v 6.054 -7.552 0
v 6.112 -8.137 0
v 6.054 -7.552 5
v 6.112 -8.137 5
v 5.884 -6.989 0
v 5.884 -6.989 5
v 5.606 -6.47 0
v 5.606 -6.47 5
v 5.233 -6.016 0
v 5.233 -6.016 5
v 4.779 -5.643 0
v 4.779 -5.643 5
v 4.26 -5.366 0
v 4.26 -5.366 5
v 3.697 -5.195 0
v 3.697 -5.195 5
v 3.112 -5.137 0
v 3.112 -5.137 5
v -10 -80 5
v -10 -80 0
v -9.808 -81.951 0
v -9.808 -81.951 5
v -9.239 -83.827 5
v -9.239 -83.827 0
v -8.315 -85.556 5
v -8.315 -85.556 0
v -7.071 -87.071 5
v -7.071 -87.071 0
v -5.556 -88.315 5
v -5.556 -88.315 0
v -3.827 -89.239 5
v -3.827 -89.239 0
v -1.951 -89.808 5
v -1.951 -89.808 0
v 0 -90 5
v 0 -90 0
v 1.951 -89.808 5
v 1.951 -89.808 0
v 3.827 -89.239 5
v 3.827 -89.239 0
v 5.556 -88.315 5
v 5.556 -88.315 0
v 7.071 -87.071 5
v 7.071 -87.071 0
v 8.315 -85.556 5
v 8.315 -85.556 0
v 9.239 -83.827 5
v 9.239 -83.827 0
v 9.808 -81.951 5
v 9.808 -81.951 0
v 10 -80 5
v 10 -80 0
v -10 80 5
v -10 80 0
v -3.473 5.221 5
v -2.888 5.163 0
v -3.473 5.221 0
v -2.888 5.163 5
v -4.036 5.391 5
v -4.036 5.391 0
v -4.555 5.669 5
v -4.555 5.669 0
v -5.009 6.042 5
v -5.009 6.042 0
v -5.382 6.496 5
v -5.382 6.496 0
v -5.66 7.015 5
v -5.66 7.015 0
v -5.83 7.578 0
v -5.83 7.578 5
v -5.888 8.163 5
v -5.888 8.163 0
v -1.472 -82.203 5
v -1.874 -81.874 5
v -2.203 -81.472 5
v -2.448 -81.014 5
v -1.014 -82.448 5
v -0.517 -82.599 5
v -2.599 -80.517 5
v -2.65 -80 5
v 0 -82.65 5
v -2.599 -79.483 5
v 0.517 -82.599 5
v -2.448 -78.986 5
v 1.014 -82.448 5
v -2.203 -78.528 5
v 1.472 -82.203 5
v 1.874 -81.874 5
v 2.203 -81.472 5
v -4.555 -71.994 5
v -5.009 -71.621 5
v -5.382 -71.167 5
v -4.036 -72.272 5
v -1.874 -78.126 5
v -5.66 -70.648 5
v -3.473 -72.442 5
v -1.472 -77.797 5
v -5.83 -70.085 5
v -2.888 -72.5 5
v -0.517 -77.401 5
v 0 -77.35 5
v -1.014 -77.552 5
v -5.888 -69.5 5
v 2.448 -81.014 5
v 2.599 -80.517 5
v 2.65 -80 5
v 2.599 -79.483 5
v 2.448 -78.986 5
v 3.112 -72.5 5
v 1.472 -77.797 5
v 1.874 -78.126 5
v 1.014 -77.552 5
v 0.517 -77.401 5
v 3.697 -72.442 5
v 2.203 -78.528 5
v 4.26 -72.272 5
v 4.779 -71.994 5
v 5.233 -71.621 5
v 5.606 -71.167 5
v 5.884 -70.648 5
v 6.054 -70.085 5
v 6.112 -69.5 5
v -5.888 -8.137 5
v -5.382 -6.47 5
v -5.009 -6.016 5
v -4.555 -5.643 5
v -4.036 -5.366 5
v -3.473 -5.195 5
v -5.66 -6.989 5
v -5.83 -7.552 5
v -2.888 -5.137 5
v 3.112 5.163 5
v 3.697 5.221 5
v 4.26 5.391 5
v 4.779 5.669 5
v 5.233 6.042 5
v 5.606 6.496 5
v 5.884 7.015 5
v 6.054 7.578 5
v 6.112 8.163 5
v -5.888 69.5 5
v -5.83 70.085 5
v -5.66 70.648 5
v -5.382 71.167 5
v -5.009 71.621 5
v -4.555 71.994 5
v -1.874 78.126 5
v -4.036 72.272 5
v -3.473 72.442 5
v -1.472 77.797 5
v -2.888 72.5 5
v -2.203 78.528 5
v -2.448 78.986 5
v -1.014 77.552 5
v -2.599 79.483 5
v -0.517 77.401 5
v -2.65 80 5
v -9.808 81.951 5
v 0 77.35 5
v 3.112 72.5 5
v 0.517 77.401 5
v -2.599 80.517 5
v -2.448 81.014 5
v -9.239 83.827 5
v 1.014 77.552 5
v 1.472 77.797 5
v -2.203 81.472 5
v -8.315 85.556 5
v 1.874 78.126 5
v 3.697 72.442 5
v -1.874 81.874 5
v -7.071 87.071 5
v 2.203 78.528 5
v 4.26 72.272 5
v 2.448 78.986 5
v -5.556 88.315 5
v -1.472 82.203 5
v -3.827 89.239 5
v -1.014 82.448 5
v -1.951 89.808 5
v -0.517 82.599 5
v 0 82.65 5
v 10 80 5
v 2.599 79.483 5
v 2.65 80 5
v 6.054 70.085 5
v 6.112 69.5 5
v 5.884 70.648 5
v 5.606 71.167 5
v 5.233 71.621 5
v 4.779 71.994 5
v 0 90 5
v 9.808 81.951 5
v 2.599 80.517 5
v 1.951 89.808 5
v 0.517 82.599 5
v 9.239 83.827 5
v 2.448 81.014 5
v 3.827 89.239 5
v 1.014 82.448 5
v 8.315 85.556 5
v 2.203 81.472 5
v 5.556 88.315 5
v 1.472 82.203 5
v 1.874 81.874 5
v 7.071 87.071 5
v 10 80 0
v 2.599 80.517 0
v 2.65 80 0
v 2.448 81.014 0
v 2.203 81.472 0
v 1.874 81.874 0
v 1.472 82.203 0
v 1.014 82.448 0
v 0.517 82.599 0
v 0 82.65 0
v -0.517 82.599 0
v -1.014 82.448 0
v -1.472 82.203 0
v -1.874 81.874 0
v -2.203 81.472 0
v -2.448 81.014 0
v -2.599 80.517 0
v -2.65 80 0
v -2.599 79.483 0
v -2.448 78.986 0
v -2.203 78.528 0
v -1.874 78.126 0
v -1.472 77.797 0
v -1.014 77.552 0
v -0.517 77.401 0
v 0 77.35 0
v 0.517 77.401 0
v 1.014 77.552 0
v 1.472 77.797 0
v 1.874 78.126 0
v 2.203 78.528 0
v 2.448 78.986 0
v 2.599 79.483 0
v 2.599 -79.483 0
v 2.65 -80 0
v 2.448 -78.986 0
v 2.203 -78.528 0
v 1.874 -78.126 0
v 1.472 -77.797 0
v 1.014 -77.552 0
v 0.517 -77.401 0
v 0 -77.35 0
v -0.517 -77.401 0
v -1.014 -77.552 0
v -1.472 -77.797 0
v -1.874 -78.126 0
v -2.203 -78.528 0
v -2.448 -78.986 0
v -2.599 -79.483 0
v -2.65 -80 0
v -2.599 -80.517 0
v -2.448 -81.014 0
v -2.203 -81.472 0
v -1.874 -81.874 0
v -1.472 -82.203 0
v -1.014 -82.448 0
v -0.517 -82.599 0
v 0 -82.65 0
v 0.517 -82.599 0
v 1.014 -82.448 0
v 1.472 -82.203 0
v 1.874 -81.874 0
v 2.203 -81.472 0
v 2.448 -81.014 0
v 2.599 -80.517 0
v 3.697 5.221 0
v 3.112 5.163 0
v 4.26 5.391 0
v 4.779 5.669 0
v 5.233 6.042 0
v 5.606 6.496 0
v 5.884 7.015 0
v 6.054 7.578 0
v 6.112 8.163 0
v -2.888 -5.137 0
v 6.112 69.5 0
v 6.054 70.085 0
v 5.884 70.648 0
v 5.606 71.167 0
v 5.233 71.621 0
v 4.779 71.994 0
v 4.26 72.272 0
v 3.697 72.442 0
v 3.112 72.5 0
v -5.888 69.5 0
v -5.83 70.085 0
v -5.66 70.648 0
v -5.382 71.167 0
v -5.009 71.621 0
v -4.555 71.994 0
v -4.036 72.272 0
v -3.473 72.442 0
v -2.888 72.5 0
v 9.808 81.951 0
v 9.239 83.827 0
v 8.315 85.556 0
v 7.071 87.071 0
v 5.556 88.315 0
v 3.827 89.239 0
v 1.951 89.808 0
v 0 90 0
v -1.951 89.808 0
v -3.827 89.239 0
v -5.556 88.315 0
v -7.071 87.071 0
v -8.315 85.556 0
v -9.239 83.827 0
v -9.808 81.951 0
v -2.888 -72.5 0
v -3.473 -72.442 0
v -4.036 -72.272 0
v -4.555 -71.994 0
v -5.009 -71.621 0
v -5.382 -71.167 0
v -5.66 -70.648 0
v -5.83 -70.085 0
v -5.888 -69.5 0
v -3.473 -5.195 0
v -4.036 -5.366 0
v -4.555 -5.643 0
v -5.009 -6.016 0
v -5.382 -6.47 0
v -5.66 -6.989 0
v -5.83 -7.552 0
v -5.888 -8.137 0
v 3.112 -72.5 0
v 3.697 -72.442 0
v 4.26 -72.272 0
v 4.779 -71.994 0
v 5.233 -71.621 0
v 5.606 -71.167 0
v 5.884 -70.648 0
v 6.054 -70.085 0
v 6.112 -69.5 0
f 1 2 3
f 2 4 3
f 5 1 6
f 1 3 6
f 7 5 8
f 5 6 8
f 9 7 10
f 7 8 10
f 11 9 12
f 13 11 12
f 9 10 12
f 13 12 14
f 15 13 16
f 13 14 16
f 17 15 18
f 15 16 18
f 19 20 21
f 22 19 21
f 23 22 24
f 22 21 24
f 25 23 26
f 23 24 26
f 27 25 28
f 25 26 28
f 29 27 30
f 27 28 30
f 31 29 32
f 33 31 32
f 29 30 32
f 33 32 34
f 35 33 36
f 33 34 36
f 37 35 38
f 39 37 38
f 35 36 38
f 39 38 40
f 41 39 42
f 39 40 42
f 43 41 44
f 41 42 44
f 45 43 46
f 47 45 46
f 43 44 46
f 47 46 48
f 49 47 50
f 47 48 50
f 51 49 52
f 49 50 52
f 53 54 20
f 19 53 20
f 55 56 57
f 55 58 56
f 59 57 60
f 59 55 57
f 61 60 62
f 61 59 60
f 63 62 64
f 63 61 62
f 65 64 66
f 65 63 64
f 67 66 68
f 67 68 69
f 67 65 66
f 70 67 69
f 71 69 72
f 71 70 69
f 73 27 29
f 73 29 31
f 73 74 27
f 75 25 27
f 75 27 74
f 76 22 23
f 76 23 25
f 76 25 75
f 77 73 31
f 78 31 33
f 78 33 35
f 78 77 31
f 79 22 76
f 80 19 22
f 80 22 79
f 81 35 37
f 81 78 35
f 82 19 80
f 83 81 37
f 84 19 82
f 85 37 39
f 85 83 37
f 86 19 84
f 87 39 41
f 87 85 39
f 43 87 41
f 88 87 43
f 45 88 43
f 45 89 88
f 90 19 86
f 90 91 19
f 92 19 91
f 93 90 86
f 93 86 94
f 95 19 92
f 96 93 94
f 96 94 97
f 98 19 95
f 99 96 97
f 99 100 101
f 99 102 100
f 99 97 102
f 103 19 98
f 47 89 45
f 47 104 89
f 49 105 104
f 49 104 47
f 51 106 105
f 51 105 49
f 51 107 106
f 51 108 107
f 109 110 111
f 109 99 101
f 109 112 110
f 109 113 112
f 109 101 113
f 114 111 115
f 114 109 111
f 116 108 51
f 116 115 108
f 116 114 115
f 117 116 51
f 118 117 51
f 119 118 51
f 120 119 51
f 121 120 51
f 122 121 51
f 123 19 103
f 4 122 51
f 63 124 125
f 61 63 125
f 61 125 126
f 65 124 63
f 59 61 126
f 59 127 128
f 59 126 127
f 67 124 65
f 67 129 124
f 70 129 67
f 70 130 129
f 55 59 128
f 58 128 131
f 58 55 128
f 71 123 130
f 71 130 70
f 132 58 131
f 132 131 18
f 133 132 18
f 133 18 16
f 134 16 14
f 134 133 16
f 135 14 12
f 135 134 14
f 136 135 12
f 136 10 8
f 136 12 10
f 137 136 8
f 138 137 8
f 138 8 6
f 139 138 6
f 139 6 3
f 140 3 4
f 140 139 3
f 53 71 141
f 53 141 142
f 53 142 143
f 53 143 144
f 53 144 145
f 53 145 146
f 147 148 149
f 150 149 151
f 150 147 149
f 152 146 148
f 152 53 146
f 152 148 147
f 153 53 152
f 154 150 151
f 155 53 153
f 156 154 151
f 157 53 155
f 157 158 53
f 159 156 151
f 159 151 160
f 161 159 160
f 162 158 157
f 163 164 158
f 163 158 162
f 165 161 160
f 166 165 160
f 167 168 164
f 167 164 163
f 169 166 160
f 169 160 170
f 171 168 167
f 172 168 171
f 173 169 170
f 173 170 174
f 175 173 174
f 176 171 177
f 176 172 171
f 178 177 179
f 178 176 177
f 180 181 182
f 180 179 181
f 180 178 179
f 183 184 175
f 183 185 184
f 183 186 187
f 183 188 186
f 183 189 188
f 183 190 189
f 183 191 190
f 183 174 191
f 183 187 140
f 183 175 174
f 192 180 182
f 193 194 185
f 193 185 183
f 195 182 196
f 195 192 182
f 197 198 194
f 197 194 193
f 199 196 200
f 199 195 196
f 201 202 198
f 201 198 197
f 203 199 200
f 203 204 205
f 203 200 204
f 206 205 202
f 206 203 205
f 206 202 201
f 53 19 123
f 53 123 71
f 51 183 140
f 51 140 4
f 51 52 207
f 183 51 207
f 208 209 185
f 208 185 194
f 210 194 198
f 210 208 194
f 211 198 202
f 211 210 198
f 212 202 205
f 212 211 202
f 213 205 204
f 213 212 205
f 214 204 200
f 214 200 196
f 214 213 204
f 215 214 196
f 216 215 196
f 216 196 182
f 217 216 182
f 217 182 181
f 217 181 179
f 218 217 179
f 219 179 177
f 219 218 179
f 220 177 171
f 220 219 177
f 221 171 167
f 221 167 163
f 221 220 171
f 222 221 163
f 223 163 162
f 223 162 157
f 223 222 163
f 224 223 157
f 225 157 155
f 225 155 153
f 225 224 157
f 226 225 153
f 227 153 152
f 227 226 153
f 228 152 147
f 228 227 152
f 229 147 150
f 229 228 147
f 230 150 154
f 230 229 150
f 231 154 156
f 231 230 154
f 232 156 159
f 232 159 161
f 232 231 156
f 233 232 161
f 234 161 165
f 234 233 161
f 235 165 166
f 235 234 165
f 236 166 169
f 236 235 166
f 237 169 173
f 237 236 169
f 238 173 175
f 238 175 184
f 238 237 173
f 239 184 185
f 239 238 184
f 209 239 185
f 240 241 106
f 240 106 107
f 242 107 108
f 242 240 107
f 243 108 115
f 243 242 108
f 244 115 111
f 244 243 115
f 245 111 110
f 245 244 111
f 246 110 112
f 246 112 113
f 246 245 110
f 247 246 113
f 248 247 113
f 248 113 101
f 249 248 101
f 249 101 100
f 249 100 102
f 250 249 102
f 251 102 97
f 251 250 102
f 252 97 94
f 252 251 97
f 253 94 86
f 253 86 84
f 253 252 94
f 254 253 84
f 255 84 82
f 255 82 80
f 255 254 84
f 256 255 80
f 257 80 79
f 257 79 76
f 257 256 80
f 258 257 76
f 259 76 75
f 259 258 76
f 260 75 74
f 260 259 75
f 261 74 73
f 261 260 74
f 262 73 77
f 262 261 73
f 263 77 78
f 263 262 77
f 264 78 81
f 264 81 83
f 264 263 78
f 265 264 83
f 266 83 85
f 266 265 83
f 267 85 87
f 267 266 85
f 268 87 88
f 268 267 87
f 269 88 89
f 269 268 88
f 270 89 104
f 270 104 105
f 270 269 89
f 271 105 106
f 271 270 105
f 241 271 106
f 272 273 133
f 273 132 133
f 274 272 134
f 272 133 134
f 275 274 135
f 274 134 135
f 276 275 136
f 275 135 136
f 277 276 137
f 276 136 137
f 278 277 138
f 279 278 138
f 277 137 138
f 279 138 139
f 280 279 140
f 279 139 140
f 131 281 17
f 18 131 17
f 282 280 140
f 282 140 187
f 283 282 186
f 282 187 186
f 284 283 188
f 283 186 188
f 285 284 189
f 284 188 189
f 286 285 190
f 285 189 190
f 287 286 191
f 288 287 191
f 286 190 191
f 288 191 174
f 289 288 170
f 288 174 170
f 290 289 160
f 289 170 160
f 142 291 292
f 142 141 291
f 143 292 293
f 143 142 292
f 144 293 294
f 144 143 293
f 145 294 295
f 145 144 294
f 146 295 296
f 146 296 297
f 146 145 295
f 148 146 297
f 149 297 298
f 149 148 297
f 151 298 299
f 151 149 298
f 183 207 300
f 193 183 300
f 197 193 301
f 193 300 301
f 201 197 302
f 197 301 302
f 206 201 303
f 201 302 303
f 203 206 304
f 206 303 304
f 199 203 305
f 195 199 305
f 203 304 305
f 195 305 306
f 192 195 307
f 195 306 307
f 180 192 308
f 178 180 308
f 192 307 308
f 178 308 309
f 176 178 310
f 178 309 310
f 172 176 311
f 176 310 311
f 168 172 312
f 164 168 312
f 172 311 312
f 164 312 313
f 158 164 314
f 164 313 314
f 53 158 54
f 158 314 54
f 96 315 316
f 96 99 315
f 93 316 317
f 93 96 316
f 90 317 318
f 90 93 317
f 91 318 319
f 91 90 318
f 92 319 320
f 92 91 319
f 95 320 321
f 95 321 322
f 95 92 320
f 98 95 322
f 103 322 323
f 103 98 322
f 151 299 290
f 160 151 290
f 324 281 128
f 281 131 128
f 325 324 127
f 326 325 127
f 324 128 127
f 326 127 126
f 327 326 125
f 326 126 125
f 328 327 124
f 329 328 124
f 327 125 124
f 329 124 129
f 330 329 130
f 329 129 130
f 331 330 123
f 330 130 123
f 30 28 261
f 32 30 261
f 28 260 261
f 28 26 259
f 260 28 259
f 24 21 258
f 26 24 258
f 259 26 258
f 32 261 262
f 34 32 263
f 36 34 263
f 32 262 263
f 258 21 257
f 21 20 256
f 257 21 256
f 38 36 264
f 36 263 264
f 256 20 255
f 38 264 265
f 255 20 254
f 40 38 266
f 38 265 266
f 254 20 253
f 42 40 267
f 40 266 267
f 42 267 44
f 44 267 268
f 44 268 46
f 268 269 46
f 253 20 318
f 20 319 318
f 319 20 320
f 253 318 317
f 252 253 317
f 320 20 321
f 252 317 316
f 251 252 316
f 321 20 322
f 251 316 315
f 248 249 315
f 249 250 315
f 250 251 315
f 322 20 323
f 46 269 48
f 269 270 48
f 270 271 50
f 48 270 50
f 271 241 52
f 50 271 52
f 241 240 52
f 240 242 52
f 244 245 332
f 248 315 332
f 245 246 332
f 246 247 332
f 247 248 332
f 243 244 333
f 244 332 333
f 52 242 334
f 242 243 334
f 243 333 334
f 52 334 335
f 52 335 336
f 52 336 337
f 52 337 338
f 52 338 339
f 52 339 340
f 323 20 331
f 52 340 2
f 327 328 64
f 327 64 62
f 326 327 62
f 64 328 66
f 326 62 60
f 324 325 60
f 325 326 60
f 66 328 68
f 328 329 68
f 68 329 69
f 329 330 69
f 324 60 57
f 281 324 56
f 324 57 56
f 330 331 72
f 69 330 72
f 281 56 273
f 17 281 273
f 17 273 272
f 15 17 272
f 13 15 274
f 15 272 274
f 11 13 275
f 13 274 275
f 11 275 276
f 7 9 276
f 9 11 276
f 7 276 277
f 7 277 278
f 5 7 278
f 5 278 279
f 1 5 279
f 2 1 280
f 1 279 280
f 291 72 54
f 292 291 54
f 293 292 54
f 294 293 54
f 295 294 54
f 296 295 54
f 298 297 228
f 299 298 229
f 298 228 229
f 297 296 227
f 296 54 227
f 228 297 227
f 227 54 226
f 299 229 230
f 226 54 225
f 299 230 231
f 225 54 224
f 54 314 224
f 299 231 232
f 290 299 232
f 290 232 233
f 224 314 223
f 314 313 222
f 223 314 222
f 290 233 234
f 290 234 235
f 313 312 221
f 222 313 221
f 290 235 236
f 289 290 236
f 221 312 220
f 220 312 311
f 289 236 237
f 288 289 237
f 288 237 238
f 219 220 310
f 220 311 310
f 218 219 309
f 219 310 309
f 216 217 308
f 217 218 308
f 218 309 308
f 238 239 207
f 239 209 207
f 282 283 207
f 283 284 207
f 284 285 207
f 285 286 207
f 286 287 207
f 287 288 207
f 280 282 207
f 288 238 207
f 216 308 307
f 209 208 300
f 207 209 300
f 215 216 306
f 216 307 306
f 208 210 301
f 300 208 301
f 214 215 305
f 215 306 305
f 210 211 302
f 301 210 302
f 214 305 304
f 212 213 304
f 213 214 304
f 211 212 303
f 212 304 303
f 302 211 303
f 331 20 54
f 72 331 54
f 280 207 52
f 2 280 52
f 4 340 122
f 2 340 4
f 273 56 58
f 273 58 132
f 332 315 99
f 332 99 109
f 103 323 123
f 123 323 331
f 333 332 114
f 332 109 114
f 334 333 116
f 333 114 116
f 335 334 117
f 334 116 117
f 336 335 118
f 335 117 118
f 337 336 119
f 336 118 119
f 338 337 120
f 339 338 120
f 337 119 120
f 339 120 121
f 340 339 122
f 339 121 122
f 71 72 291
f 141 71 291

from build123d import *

# Parameters (mm, degrees)
SKETCH_1_R      = 2.65
SKETCH_1_W      = 12
SKETCH_1_H      = 67.337004634
SKETCH_1_H_2    = 67.362830637
EXTRUDE_1_DEPTH = 5
FILLET_1_R      = 3


with BuildPart() as part:
    # 草图1 → 凸台-拉伸1 (new body)
    with BuildSketch(Plane.XY):
        with BuildLine():
            Line((-10, 80), (-10, -80))
            ThreePointArc((-10, -80), (0, -90), (10, -80))
            Line((10, -80), (10, 80))
            ThreePointArc((10, 80), (0, 90), (-10, 80))
        make_face()
        with Locations((0, 80)):
            Circle(SKETCH_1_R, mode=Mode.SUBTRACT)
        with Locations((0, -80)):
            Circle(SKETCH_1_R, mode=Mode.SUBTRACT)
        with Locations((0.111968731, 38.831497683)):
            Rectangle(SKETCH_1_W, SKETCH_1_H, mode=Mode.SUBTRACT)
        with Locations((0.111968731, -38.818584681)):
            Rectangle(SKETCH_1_W, SKETCH_1_H_2, mode=Mode.SUBTRACT)
    extrude(amount=EXTRUDE_1_DEPTH)

    # 圆角1
    fillet_1_edges = [part.edges().sort_by_distance(p)[0] for p in [
        (-5.888031269, 5.162995366, 2.5),
        (6.111968731, 5.162995366, 2.5),
        (6.111968731, 72.5, 2.5),
        (-5.888031269, 72.5, 2.5),
        (-5.888031269, -5.137169363, 2.5),
        (-5.888031269, -72.5, 2.5),
        (6.111968731, -72.5, 2.5),
        (6.111968731, -5.137169363, 2.5),
    ]]
    fillet(fillet_1_edges, radius=FILLET_1_R)


solid = part.part
